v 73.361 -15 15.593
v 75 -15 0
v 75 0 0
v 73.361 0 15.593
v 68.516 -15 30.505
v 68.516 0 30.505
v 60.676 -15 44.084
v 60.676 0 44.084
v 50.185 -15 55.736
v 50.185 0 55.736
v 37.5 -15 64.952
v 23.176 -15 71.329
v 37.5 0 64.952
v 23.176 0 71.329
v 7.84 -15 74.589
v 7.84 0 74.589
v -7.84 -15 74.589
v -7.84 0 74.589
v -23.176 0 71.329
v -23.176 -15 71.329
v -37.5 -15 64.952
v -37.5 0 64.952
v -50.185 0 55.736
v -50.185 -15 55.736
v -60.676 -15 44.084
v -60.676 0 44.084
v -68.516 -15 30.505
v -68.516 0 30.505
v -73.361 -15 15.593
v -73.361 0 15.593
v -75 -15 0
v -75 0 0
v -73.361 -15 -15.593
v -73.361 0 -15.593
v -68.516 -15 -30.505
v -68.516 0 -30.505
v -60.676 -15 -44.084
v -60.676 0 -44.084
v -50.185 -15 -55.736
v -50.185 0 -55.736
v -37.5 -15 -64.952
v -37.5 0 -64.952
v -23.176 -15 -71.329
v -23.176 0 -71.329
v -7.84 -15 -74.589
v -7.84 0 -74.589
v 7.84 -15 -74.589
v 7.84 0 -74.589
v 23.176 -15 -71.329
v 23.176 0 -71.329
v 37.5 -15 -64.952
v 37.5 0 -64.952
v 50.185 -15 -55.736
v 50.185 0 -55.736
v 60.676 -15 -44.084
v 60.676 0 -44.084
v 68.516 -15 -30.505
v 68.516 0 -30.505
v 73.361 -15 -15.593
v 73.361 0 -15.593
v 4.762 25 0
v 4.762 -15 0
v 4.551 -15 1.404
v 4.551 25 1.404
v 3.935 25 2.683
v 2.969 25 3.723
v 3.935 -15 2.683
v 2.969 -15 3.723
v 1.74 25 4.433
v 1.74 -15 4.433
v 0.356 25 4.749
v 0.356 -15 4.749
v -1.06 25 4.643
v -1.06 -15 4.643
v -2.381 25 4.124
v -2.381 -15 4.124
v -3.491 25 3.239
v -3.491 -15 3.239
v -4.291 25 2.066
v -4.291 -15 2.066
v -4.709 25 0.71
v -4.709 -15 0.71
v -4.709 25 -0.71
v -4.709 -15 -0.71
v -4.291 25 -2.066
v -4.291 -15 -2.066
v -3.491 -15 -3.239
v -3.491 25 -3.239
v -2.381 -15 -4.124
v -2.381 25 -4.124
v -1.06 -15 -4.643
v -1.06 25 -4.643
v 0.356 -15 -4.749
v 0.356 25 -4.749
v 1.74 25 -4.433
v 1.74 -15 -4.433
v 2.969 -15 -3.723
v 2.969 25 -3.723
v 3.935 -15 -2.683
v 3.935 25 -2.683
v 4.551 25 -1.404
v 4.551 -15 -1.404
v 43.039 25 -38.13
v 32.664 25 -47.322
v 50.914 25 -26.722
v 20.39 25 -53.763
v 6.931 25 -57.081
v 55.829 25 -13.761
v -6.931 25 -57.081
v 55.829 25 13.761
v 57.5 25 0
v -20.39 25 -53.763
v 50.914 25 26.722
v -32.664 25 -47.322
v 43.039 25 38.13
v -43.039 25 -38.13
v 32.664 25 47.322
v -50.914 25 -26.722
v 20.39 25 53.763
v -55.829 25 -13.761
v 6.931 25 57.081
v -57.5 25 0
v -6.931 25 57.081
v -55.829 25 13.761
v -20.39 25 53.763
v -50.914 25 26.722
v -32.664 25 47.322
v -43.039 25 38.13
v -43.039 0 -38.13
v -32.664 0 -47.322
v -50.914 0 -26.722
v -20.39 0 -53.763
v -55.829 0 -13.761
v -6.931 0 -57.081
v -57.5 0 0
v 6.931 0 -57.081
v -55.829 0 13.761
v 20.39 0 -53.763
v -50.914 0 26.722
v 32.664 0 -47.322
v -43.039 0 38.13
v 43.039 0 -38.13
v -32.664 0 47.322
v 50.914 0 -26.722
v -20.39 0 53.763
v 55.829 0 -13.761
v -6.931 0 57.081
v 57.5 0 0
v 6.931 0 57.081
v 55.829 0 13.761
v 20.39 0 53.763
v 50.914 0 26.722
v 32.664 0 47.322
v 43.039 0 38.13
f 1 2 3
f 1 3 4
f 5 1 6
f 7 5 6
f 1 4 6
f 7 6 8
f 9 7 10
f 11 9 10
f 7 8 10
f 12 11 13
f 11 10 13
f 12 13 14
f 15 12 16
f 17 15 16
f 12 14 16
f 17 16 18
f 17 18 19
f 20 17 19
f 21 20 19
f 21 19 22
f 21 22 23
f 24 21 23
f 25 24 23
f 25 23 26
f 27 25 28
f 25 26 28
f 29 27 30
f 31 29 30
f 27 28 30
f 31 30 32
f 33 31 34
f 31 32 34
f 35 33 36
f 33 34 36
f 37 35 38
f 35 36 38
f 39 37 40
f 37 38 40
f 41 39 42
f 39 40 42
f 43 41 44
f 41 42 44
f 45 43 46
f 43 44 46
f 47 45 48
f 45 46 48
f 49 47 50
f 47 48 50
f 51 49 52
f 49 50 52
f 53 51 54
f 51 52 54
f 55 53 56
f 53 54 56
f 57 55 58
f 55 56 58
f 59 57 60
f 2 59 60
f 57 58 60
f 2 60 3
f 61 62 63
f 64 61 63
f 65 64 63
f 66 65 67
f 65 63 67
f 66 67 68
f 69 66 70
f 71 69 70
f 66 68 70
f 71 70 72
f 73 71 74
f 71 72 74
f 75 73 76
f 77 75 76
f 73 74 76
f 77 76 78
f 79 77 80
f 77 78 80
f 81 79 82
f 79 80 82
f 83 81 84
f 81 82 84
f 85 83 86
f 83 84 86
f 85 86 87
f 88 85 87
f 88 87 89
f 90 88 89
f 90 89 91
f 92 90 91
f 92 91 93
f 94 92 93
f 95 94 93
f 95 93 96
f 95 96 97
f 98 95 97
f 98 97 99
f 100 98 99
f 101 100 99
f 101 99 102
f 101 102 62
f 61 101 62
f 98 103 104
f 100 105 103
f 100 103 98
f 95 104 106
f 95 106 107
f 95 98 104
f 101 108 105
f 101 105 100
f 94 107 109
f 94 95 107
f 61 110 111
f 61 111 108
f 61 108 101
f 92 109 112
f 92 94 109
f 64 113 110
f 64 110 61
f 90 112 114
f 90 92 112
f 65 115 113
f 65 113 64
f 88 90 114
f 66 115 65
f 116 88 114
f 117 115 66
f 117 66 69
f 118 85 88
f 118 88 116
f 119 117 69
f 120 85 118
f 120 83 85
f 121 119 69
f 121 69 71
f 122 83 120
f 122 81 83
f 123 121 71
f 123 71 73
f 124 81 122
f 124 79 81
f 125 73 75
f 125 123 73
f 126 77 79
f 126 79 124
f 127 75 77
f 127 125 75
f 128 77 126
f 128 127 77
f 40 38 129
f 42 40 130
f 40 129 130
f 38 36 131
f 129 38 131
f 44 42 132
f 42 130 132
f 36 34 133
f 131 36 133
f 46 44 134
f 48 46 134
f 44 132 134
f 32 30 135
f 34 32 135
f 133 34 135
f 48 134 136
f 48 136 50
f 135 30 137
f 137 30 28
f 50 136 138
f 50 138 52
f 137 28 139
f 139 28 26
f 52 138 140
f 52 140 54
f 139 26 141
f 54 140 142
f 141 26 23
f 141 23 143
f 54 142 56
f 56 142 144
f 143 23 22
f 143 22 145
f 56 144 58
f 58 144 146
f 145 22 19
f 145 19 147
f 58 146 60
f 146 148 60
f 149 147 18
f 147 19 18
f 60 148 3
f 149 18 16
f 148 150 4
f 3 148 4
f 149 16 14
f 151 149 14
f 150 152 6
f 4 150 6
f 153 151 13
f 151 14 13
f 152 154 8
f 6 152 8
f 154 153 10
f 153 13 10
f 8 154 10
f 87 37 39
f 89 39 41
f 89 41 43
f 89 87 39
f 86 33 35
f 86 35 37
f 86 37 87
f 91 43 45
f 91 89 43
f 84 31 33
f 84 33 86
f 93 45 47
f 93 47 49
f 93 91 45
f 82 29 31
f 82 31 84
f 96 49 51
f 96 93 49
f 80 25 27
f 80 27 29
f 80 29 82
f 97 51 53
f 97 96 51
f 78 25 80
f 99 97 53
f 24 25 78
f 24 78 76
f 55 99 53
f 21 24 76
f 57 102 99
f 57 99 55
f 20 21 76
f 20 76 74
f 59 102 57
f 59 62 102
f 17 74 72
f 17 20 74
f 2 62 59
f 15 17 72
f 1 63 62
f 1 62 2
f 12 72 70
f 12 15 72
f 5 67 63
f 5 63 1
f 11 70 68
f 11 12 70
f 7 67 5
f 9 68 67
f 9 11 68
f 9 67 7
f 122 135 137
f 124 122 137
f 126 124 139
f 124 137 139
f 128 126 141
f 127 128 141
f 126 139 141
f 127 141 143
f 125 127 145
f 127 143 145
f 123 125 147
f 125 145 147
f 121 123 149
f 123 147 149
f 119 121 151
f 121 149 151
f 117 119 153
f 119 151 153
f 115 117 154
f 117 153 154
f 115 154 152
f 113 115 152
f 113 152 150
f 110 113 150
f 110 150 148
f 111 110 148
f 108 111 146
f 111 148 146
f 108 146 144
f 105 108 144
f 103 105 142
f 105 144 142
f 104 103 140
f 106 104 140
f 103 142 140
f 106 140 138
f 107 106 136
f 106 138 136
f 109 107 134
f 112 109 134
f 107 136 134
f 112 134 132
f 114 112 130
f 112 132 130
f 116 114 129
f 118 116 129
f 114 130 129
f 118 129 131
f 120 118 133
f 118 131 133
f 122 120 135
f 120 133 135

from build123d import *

# Parameters (mm, degrees)
F0_R     = 75
F1_DEPTH = 15
F2_R     = 57.5
F3_DEPTH = 25
F4_R     = 4.7625
F5_DEPTH = 40.001


with BuildPart() as f1:
    # F0 (on Front) → F1 (new body)
    with BuildSketch(Plane.XZ):
        Circle(F0_R)
    extrude(amount=F1_DEPTH)

    # F2 (on face) → F3 (join)
    with BuildSketch(Plane(origin=(0, 0, 0), x_dir=(-1, 0, 0), z_dir=(0, 1, 0))):
        Circle(F2_R)
    extrude(amount=F3_DEPTH)

    # F4 (on face) → F5 (cut, through all)
    with BuildSketch(Plane.XZ.offset(15)):
        Circle(F4_R)
    extrude(amount=-F5_DEPTH, mode=Mode.SUBTRACT)


solid = f1.part
